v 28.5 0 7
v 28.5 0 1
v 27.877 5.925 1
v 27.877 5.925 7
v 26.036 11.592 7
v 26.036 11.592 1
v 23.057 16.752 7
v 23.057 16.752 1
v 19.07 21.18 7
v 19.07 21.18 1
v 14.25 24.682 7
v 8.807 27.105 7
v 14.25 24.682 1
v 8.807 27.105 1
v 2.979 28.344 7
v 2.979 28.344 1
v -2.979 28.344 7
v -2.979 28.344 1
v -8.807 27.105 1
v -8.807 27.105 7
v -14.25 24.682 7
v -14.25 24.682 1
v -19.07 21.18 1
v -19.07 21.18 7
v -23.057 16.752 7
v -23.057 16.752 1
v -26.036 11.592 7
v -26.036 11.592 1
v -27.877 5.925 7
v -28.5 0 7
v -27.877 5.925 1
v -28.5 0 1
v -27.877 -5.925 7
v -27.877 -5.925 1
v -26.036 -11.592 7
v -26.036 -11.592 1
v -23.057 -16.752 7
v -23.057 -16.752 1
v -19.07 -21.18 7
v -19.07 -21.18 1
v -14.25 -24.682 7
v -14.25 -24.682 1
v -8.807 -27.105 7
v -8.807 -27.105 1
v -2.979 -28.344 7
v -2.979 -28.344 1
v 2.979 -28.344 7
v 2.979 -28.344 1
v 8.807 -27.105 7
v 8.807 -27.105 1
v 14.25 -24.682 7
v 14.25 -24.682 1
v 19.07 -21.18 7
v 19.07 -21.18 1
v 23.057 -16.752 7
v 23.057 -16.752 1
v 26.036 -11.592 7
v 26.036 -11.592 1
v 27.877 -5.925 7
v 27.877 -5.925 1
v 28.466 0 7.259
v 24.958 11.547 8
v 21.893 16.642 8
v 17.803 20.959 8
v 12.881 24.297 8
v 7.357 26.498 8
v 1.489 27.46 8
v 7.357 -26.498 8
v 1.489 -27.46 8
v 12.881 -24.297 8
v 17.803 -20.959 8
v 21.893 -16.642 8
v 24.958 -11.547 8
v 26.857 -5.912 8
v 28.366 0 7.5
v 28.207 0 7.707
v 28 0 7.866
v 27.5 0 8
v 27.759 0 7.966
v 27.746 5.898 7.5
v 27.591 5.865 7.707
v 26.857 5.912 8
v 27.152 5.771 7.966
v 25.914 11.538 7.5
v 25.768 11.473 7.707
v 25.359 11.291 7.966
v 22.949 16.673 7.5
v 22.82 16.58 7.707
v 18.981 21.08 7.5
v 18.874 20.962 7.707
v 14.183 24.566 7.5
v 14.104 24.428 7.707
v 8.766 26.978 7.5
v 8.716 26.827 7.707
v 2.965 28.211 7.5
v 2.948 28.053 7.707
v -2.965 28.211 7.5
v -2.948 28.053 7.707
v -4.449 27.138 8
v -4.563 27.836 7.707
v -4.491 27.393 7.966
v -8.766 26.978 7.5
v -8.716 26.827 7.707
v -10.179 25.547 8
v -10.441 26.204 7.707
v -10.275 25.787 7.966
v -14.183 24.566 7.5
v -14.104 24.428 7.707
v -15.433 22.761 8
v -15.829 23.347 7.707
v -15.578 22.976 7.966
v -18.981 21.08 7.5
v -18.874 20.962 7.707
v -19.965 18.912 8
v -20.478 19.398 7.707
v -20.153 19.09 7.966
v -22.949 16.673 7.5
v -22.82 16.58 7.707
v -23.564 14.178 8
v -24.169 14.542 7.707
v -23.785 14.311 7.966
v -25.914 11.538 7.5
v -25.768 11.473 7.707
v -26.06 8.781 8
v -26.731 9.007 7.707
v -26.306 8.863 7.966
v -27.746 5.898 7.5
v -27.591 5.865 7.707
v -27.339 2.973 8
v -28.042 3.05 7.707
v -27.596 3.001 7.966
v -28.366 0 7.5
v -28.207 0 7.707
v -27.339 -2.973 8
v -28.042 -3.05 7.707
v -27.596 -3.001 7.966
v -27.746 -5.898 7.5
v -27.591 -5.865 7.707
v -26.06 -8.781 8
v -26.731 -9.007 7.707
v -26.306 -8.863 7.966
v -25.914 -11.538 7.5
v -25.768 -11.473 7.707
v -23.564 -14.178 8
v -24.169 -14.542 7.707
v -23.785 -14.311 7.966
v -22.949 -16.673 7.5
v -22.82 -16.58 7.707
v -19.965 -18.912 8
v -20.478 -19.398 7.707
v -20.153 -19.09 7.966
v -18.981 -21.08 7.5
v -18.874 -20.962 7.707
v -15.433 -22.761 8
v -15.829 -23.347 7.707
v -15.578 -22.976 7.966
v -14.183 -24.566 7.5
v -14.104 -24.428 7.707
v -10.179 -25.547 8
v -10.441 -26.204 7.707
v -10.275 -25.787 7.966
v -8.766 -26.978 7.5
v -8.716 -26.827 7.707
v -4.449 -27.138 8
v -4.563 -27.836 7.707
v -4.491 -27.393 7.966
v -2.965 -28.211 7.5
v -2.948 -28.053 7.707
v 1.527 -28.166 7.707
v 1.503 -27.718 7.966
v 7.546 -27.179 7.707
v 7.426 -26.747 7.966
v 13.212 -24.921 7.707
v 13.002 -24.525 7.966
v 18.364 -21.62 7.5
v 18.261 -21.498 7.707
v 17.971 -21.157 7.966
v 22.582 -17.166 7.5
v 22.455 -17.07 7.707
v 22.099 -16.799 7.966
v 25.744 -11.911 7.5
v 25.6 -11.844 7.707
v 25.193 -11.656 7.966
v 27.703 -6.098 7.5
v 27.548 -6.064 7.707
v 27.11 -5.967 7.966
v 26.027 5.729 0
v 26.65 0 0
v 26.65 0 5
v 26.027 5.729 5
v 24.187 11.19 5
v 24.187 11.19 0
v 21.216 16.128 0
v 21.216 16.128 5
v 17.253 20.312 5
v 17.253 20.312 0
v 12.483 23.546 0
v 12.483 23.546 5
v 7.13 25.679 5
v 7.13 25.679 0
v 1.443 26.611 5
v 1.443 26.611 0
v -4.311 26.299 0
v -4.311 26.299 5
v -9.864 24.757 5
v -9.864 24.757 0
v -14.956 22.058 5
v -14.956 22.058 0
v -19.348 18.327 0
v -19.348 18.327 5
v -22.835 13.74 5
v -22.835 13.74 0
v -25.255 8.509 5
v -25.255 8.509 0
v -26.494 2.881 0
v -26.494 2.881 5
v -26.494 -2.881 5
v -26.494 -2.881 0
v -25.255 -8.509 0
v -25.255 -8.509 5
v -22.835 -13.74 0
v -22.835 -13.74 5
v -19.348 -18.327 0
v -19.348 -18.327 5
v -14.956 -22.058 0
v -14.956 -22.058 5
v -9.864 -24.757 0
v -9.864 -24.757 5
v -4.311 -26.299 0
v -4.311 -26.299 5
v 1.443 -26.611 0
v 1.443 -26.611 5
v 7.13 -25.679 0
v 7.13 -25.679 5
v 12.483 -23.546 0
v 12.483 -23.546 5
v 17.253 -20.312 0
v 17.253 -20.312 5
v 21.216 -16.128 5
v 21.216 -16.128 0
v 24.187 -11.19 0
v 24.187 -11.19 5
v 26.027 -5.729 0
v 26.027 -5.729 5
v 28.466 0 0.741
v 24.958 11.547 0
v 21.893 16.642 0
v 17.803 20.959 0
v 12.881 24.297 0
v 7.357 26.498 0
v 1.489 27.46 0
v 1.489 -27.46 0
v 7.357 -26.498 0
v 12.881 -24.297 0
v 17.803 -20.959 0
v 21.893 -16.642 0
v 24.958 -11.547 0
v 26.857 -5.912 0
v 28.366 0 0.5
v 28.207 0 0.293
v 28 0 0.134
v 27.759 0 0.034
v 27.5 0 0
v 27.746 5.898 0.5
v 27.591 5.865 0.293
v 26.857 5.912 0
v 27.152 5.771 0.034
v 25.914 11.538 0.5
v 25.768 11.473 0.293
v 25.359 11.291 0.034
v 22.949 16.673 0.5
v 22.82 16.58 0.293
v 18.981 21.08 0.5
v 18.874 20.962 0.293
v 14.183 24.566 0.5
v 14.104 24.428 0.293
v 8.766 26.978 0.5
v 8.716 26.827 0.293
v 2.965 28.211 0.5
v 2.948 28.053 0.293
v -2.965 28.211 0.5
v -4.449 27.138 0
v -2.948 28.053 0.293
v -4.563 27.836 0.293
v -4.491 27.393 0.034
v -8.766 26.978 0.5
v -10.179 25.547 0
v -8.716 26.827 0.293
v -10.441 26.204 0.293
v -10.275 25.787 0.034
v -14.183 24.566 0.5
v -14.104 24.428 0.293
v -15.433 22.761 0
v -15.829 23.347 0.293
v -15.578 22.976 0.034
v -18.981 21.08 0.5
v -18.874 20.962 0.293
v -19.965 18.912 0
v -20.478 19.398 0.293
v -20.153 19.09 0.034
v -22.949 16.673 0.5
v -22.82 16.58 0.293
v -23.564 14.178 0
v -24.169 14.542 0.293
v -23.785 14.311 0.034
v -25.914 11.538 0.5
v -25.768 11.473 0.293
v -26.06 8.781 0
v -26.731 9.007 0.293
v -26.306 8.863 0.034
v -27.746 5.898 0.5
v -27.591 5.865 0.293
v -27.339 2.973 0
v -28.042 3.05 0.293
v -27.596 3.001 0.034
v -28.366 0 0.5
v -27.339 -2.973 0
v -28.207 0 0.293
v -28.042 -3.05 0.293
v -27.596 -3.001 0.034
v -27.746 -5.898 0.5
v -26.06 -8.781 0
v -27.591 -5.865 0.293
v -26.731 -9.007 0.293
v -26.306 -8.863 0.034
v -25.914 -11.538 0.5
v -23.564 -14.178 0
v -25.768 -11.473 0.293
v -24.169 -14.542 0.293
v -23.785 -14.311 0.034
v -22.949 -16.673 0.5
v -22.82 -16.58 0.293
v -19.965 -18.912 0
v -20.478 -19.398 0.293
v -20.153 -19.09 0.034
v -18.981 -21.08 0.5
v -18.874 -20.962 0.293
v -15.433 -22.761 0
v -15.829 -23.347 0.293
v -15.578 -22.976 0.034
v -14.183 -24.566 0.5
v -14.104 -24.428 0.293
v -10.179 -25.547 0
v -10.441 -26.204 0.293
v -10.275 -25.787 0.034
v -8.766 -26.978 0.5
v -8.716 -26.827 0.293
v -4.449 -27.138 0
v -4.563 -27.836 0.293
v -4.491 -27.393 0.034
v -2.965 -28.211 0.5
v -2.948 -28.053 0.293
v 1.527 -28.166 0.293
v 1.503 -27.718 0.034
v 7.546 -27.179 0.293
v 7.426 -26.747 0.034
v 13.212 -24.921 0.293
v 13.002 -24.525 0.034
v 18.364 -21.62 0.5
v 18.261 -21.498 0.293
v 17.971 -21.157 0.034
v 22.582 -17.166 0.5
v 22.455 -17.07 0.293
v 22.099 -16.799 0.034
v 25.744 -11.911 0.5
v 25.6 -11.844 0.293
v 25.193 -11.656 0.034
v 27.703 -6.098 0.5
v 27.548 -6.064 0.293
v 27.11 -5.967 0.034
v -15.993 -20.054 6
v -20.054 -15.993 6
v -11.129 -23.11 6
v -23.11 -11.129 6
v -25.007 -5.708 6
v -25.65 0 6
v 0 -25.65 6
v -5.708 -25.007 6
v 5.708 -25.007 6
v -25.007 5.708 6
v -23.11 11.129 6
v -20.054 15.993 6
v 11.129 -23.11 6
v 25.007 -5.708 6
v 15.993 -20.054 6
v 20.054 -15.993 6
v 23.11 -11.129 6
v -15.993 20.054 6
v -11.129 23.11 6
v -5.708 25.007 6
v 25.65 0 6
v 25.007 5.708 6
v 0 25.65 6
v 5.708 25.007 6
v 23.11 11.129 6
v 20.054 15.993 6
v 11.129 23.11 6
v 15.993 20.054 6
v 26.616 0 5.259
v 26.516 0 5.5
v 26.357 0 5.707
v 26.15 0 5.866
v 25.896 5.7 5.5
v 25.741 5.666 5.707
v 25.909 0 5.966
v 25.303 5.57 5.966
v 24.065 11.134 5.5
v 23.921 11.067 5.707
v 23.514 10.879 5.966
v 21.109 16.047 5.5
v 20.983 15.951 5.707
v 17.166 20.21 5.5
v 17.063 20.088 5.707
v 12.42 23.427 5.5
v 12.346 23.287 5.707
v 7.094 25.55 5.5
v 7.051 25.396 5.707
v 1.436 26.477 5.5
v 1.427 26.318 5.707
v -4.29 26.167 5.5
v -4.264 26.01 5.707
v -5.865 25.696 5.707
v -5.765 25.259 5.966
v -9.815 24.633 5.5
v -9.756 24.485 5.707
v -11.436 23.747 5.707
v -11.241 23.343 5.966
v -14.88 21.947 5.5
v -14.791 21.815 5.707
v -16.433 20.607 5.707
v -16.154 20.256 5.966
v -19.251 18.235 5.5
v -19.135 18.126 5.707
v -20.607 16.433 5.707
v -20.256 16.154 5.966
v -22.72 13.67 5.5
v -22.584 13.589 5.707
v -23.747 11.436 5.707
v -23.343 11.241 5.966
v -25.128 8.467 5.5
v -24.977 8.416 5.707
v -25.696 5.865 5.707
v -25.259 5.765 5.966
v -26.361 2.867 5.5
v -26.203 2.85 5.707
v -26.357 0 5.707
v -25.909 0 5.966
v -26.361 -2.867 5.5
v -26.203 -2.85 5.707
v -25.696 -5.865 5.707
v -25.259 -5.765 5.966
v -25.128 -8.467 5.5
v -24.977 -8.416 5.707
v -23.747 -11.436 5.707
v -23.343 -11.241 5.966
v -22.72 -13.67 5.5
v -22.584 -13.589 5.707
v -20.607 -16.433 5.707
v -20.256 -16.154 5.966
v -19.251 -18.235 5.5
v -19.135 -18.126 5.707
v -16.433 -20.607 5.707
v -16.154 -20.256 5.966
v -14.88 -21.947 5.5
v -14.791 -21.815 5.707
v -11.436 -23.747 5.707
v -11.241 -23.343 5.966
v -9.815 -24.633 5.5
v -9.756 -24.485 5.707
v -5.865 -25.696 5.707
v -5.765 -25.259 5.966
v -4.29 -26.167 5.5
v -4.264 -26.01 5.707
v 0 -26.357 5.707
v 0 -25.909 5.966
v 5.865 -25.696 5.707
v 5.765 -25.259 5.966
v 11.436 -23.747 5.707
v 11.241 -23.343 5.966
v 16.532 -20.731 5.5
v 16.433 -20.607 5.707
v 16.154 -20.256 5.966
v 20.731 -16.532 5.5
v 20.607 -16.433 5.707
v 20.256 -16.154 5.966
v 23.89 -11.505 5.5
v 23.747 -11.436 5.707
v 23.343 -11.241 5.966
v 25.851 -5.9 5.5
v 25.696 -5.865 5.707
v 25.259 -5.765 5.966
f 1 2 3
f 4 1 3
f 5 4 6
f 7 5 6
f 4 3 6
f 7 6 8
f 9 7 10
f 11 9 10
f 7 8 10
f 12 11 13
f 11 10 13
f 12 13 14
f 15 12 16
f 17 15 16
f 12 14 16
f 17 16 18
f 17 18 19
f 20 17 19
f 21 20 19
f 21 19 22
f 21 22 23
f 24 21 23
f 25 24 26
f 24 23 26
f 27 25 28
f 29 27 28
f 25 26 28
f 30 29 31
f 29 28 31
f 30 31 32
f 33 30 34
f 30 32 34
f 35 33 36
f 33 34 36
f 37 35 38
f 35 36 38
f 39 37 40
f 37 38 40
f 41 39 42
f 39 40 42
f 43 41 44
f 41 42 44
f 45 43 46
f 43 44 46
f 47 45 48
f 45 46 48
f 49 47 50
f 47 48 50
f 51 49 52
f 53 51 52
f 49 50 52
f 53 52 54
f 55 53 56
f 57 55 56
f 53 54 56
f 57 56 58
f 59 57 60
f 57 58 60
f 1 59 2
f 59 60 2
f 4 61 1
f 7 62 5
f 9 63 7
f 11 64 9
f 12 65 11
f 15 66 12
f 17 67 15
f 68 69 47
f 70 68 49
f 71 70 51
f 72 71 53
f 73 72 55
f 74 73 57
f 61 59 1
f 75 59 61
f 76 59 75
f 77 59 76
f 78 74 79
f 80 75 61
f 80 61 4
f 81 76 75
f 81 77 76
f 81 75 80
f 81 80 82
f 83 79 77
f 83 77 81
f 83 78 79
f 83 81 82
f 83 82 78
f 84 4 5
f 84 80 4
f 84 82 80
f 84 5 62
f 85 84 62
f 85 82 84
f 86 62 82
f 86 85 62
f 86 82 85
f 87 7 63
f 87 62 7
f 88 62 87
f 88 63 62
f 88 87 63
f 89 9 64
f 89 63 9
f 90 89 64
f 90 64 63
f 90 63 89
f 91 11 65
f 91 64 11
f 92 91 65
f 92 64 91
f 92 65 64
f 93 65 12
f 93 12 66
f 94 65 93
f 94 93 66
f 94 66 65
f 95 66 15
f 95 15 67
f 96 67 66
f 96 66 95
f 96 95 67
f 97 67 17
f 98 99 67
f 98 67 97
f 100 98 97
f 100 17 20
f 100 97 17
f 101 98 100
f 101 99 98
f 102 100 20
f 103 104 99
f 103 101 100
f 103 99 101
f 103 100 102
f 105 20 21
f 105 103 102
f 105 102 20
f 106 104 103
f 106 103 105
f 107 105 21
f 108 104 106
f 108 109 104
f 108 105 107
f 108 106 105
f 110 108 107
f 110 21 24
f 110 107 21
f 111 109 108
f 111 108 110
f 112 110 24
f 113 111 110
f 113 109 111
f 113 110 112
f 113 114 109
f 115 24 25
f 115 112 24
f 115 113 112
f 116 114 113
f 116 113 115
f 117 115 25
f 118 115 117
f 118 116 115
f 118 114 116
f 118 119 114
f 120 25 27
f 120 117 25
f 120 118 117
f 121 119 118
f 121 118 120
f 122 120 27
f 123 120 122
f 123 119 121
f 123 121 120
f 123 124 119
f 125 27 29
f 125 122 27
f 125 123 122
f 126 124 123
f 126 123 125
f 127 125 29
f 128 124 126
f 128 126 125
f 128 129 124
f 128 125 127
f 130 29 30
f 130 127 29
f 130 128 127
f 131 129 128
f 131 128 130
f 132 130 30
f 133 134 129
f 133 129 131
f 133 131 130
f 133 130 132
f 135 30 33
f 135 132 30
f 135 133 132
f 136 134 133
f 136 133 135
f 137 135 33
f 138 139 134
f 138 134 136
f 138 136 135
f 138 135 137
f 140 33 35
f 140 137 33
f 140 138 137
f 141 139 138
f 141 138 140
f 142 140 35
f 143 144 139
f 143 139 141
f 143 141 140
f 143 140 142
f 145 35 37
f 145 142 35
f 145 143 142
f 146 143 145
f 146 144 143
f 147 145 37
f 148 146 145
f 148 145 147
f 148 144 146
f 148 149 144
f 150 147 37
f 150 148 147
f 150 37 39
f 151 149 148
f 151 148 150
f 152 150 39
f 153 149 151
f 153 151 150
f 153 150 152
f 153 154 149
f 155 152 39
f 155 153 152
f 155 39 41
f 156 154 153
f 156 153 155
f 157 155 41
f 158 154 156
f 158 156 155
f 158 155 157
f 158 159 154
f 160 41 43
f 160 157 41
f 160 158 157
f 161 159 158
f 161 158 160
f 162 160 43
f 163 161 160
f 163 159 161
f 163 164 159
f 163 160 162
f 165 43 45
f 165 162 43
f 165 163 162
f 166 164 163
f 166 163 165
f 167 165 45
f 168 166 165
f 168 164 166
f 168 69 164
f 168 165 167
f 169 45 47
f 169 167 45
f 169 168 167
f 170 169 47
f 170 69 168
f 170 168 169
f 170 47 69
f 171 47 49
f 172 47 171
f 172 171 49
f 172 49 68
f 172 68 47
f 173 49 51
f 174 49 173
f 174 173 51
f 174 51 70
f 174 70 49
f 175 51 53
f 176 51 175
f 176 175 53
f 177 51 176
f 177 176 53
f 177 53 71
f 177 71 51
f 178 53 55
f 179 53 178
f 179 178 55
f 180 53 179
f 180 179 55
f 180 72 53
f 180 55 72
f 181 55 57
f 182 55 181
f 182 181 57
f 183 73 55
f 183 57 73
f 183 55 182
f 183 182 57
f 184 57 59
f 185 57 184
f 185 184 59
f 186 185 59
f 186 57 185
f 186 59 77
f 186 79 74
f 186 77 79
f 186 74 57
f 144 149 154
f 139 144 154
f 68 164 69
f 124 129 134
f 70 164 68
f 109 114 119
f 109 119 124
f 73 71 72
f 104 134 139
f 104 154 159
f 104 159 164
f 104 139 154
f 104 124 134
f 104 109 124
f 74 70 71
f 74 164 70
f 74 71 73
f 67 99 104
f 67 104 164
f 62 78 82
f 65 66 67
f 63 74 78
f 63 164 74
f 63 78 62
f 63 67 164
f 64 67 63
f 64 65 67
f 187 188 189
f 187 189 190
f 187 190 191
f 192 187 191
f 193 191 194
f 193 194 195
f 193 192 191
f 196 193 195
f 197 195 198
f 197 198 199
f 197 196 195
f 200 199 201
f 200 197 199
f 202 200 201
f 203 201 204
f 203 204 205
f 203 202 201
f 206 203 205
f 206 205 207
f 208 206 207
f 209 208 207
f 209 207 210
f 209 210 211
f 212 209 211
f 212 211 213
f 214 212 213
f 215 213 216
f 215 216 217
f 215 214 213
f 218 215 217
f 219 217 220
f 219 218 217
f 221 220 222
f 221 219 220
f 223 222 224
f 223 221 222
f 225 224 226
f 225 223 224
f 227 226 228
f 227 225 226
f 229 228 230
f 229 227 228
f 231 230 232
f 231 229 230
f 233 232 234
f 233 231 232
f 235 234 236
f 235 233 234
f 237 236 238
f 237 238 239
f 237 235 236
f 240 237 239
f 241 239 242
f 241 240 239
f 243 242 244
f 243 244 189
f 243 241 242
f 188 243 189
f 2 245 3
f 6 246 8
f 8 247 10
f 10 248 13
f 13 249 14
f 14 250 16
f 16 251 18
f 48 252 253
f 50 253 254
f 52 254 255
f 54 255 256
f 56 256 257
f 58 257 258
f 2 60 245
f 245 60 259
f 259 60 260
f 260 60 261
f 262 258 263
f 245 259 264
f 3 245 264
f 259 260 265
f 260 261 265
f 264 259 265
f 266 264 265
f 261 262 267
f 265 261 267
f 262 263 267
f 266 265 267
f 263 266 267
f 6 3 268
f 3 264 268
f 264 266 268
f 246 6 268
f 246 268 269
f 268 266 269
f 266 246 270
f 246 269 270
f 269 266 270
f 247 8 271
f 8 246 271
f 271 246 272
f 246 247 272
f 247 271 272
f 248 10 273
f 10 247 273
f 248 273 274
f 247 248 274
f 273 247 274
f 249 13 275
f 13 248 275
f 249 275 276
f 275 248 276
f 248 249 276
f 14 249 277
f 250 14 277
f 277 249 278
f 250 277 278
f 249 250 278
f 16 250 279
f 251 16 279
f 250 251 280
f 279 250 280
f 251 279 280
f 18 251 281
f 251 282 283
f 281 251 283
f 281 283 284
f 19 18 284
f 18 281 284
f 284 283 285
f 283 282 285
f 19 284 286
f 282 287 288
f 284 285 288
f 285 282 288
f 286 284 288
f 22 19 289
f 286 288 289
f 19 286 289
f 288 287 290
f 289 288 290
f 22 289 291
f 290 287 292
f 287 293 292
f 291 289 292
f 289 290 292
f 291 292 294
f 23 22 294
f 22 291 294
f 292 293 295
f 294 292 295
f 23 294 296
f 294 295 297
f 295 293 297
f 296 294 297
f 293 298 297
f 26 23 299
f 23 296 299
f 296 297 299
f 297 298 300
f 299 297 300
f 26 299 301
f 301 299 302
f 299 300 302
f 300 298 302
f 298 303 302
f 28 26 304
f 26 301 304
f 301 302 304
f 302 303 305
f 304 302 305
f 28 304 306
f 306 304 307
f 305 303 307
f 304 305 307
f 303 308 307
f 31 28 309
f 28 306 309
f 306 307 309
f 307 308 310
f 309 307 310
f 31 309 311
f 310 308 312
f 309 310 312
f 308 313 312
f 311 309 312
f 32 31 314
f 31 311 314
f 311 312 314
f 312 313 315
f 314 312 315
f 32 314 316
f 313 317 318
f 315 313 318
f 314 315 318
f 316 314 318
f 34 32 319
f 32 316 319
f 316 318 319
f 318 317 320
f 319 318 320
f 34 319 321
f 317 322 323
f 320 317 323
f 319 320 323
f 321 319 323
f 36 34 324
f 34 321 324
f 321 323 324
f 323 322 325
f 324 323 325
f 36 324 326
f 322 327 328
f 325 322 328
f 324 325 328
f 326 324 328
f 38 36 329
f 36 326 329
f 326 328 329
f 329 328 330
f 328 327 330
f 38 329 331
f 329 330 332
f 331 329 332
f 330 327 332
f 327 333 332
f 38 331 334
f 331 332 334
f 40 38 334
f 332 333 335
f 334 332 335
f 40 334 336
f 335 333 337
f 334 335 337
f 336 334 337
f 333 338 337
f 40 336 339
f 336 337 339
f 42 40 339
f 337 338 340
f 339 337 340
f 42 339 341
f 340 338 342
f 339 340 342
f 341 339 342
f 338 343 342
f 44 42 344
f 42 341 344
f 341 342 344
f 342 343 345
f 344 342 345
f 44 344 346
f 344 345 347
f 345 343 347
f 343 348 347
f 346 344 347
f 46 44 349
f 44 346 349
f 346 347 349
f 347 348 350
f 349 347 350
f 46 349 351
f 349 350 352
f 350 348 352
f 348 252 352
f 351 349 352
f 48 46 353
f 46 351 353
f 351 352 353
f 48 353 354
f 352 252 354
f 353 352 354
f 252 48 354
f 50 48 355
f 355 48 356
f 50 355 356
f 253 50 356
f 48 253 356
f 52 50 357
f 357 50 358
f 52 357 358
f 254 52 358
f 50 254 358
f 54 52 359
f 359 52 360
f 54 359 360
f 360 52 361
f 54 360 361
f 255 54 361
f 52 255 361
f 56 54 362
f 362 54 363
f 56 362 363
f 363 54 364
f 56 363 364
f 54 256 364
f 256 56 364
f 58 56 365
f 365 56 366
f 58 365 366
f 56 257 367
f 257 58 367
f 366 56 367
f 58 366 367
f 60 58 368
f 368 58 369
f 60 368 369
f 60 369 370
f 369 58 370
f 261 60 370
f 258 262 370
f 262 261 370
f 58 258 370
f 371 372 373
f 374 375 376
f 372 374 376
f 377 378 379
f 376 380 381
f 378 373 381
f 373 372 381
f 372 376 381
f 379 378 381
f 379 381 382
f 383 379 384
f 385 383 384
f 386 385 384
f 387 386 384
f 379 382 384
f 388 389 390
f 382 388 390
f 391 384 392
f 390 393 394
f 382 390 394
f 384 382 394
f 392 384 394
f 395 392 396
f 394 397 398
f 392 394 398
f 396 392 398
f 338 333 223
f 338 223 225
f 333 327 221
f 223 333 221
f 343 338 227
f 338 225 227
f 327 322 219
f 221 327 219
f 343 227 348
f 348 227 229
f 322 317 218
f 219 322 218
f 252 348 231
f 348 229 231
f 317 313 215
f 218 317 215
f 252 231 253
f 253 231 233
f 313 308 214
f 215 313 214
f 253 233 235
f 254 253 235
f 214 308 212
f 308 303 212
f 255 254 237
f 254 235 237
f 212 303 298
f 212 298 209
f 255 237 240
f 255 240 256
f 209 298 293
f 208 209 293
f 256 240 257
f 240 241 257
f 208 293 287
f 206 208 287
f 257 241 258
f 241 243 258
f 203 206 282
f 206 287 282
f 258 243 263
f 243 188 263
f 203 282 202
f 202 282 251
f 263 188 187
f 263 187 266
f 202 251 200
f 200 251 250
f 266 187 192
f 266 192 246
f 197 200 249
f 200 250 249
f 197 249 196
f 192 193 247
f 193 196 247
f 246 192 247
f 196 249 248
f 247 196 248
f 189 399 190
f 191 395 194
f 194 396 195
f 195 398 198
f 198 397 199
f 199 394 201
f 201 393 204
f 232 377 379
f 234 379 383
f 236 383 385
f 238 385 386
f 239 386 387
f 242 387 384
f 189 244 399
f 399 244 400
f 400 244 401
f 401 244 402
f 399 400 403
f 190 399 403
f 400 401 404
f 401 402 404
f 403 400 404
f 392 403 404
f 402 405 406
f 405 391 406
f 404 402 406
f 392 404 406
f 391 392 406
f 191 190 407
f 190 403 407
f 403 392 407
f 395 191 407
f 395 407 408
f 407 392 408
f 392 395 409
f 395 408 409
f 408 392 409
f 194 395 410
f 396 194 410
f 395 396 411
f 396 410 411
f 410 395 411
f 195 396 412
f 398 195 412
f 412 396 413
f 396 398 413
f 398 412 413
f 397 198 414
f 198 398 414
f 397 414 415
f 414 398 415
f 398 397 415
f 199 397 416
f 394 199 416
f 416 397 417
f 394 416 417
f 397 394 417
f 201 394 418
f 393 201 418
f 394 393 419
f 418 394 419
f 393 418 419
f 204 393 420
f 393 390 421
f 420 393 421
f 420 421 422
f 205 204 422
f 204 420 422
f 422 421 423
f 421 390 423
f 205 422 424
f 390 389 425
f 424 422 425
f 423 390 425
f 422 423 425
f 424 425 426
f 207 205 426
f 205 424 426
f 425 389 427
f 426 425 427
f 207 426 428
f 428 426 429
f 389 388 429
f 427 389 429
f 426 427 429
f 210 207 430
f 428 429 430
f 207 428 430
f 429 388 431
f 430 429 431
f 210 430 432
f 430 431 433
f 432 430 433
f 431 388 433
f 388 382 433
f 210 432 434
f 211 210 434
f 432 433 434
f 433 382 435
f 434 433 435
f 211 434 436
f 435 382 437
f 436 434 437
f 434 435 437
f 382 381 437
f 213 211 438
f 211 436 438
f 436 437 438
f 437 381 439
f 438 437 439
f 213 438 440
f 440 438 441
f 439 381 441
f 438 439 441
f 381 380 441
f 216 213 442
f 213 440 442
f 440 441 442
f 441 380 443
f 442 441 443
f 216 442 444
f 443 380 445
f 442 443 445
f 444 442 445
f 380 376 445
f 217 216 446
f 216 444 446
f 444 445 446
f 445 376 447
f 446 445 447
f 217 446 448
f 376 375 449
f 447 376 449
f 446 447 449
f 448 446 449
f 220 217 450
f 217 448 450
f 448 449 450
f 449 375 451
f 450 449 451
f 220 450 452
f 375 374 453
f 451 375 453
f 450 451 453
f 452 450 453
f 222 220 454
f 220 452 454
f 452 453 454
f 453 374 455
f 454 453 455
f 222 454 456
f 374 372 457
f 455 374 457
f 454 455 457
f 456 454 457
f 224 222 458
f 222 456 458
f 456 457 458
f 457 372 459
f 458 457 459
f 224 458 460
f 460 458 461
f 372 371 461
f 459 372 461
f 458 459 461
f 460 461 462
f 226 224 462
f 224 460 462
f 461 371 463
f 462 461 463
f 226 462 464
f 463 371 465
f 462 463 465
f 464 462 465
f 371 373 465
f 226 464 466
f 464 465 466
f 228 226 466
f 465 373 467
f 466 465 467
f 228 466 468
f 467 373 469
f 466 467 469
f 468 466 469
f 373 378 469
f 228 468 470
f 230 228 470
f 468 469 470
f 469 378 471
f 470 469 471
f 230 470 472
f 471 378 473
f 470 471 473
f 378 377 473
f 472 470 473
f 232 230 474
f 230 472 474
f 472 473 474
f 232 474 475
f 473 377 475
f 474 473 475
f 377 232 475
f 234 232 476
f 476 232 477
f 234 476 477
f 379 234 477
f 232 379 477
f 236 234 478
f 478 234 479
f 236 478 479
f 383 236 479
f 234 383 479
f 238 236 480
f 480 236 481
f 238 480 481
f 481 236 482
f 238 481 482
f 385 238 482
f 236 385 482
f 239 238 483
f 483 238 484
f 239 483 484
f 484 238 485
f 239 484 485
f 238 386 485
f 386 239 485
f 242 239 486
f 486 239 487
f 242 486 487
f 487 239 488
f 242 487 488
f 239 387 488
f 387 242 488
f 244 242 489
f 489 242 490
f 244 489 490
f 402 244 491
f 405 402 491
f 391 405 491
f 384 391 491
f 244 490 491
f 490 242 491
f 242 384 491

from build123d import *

# Parameters (mm, degrees)
SKETCH001_R  = 28.5
PAD_DEPTH    = 8
SKETCH_R     = 26.65
POCKET_DEPTH = 6
FILLET_R     = 1


with BuildPart() as part:
    # Sketch001 → Pad (new body)
    with BuildSketch(Plane.XY):
        Circle(SKETCH001_R)
    extrude(amount=PAD_DEPTH)

    # Sketch → Pocket (cut)
    with BuildSketch(Plane.XY):
        Circle(SKETCH_R)
    extrude(amount=POCKET_DEPTH, mode=Mode.SUBTRACT)

    # Fillet
    fillet_edges = [part.edges().sort_by_distance(p)[0] for p in [
        (-28.5, 0, 8),
        (-28.5, 0, 0),
        (-26.65, 0, 6),
    ]]
    fillet(fillet_edges, radius=FILLET_R)


solid = part.part
